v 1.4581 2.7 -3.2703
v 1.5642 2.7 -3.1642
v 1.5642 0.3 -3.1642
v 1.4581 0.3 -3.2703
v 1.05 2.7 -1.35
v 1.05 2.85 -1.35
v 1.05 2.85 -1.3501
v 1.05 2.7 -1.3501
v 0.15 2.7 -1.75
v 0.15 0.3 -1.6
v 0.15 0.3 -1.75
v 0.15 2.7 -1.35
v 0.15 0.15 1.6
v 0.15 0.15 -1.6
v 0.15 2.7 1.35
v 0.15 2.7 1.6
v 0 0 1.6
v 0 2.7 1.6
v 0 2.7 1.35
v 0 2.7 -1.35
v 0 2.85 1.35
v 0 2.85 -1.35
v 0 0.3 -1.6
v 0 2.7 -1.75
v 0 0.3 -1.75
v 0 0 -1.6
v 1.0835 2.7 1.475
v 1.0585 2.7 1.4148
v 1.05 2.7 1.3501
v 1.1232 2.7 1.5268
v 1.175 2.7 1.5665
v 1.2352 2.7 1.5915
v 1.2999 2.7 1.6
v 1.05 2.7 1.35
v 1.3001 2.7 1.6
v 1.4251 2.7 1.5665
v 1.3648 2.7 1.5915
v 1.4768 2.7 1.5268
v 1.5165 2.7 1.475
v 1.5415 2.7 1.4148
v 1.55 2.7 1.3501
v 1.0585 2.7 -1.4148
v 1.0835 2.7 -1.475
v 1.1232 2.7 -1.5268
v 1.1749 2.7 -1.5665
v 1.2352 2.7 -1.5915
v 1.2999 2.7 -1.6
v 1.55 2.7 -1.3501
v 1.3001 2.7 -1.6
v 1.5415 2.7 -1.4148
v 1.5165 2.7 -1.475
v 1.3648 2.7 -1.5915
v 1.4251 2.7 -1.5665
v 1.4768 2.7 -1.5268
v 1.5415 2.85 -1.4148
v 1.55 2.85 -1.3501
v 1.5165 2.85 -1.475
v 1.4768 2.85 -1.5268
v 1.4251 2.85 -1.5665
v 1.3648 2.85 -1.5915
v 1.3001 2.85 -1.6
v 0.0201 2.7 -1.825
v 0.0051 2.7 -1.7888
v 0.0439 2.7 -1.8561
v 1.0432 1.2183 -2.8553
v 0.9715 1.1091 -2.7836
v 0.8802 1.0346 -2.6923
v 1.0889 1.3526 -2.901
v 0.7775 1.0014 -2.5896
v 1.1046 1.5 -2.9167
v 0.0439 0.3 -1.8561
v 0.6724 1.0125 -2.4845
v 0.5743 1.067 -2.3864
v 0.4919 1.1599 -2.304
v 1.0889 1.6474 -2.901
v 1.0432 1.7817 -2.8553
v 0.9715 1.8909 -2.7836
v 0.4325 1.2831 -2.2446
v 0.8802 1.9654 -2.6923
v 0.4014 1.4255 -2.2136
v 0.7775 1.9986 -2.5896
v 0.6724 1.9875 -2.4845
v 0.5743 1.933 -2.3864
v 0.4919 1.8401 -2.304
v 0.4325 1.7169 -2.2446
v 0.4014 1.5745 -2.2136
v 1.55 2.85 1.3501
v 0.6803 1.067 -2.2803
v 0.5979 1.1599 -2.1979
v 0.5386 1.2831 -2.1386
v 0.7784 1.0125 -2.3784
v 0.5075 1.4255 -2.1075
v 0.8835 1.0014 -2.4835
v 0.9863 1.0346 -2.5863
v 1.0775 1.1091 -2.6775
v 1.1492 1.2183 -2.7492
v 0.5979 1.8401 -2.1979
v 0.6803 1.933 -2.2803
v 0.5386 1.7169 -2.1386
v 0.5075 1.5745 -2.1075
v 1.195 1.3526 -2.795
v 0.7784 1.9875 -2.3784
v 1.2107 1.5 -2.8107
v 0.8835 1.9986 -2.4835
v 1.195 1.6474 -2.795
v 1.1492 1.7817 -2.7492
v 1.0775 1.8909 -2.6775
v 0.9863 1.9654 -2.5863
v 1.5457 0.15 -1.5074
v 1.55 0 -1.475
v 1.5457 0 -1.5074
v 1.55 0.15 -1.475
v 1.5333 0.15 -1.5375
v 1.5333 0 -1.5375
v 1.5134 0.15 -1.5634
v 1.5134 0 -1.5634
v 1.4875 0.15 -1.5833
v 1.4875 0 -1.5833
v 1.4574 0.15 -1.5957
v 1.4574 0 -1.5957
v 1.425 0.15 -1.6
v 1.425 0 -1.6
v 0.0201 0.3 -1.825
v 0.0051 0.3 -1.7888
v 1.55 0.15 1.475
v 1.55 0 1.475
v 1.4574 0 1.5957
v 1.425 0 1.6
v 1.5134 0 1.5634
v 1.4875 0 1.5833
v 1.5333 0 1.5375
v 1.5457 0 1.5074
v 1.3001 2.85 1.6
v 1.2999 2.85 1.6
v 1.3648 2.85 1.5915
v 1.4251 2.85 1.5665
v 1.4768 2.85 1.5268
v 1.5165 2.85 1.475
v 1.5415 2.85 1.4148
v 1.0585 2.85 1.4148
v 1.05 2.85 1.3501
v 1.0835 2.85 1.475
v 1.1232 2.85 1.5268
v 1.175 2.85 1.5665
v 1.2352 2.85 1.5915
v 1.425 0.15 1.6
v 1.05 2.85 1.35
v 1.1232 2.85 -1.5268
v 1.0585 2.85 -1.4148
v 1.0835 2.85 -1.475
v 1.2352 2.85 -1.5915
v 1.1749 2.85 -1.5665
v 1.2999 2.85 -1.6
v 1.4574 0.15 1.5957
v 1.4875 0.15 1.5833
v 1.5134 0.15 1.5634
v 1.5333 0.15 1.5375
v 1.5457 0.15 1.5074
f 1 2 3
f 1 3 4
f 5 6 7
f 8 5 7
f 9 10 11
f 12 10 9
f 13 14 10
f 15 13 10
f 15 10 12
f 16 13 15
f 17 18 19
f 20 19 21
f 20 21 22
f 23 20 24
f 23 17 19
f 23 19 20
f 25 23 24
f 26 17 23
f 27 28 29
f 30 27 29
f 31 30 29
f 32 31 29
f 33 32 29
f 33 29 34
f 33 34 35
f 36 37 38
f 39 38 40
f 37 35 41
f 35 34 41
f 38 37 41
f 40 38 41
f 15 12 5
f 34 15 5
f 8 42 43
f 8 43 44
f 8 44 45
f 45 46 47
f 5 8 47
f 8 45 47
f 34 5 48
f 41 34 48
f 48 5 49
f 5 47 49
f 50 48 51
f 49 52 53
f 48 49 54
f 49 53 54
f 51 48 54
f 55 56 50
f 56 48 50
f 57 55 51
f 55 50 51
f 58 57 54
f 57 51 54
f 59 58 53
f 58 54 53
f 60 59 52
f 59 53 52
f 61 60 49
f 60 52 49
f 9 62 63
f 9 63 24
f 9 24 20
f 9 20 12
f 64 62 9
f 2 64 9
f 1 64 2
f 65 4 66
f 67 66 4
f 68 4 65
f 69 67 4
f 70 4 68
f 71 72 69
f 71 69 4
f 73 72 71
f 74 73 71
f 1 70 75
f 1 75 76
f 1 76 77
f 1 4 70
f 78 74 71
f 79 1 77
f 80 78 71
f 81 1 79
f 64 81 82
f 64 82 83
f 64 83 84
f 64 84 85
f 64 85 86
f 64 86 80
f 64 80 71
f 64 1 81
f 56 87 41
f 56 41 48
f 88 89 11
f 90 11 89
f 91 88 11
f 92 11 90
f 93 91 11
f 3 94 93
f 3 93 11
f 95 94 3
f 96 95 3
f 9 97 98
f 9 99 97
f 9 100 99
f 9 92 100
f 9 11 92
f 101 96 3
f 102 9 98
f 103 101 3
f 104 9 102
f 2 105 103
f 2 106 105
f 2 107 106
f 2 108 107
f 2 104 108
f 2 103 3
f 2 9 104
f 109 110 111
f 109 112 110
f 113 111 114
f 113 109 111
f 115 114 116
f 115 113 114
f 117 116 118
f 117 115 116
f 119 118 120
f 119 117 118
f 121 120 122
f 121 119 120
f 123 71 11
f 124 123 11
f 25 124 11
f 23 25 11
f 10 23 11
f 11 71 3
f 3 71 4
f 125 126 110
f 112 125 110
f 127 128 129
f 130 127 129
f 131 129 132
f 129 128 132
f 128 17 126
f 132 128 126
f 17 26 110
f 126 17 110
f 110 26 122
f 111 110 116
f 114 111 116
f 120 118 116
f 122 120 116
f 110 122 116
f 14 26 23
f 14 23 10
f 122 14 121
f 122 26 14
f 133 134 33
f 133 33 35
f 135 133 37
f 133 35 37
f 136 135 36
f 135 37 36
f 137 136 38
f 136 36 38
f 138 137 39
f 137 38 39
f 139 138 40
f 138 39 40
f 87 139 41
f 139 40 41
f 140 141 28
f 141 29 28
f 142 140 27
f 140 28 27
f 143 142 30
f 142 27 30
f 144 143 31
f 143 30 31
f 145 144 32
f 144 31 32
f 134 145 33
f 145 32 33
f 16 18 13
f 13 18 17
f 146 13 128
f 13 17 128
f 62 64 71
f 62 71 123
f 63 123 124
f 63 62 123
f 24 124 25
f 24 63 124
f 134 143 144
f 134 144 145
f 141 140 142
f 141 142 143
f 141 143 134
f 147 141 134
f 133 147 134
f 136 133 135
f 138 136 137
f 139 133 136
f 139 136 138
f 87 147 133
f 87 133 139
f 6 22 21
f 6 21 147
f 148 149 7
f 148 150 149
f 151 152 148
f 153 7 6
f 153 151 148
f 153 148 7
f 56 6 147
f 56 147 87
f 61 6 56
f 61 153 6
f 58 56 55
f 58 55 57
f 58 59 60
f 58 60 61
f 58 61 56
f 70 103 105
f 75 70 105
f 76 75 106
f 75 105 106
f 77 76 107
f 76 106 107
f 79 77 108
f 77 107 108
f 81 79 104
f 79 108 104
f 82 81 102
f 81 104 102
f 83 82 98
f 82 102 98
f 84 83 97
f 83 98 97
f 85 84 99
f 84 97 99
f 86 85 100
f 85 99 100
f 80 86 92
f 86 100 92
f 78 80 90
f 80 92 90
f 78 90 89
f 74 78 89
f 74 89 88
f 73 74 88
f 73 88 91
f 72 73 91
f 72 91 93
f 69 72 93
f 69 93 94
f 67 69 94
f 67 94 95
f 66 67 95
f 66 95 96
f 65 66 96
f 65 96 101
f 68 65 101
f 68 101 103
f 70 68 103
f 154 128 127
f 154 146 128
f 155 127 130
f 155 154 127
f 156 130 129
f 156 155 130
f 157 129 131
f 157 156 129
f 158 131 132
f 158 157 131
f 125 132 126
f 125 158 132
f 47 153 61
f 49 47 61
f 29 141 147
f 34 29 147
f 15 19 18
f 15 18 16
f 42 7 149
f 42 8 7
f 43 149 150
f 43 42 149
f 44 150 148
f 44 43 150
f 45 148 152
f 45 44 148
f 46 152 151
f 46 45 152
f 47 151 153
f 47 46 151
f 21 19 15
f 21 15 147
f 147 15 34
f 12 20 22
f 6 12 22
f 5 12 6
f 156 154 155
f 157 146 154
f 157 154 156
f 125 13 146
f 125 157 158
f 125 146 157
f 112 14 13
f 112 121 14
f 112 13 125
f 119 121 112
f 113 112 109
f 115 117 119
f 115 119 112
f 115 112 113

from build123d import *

# Parameters (mm, degrees)
SKETCH1_W           = 1.55
SKETCH1_H           = 3.2
BOSS_EXTRUDE1_DEPTH = 0.15
FILLET1_R           = 0.125
SKETCH2_W           = 0.15
SKETCH2_H           = 3.2
BOSS_EXTRUDE2_DEPTH = 2.55
SKETCH3_W           = 0.15
SKETCH3_H           = 2.4
BOSS_EXTRUDE3_DEPTH = 0.15
BOSS_EXTRUDE4_DEPTH = 2.4
SKETCH5_R           = 0.5
CUT_EXTRUDE1_DEPTH  = 5.356809265
SKETCH6_W           = 1.05
SKETCH6_H           = 2.7
BOSS_EXTRUDE5_DEPTH = 0.15
SKETCH7_W           = 0.5
SKETCH7_H           = 3.2
BOSS_EXTRUDE6_DEPTH = 0.15
FILLET2_R           = 0.25


with BuildPart() as part:
    # Sketch1 → Boss-Extrude1 (new body)
    with BuildSketch(Plane(origin=(0, 0, 0), x_dir=(1, 0, 0), z_dir=(0, 1, 0))):
        with Locations((0.775, 0)):
            Rectangle(SKETCH1_W, SKETCH1_H)
    extrude(amount=BOSS_EXTRUDE1_DEPTH)

    # Fillet1
    fillet1_edges = [part.edges().sort_by_distance(p)[0] for p in [
        (1.55, 0.075, -1.6),
        (1.55, 0.075, 1.6),
    ]]
    fillet(fillet1_edges, radius=FILLET1_R)

    # Sketch2 → Boss-Extrude2 (add)
    with BuildSketch(Plane(origin=(0, 0.15, 0), x_dir=(1, 0, 0), z_dir=(0, 1, 0))):
        with Locations((0.075, 0)):
            Rectangle(SKETCH2_W, SKETCH2_H)
    extrude(amount=BOSS_EXTRUDE2_DEPTH)

    # Sketch3 → Boss-Extrude3 (add)
    with BuildSketch(Plane(origin=(0, 0, -1.6), x_dir=(-1, 0, 0), z_dir=(0, 0, -1))):
        with Locations((-0.075, 1.5)):
            Rectangle(SKETCH3_W, SKETCH3_H)
    extrude(amount=BOSS_EXTRUDE3_DEPTH)

    # Sketch4 → Boss-Extrude4 (add)
    with BuildSketch(Plane(origin=(0, 2.7, 0), x_dir=(1, 0, 0), z_dir=(0, 1, 0))):
        with BuildLine():
            Line((0.15, 1.75), (1.564213562, 3.164213562))
            Line((1.564213562, 3.164213562), (1.458147545, 3.27027958))
            Line((1.458147545, 3.27027958), (0.043933983, 1.856066017))
            ThreePointArc((0.043933983, 1.856066017), (0.01141807, 1.807402515), (0, 1.75))
            Line((0, 1.75), (0.15, 1.75))
        make_face()
    extrude(amount=-BOSS_EXTRUDE4_DEPTH)

    # Sketch5 → Cut-Extrude1 (cut, through all)
    with BuildSketch(Plane(origin=(-0.8, 0, -0.8), x_dir=(0.7071067811865511, 0, -0.7071067811865439), z_dir=(0.7071067811865439, 0, 0.7071067811865511))):
        with Locations((2.343502884, 1.5)):
            Circle(SKETCH5_R)
    extrude(amount=-CUT_EXTRUDE1_DEPTH, mode=Mode.SUBTRACT)

    # Sketch6 → Boss-Extrude5 (add)
    with BuildSketch(Plane(origin=(0, 2.7, 0), x_dir=(1, 0, 0), z_dir=(0, 1, 0))):
        with Locations((0.525, 0)):
            Rectangle(SKETCH6_W, SKETCH6_H)
    extrude(amount=BOSS_EXTRUDE5_DEPTH)

    # Sketch7 → Boss-Extrude6 (add)
    with BuildSketch(Plane(origin=(0, 2.85, 0), x_dir=(1, 0, 0), z_dir=(0, 1, 0))):
        with Locations((1.3, 0)):
            Rectangle(SKETCH7_W, SKETCH7_H)
    extrude(amount=-BOSS_EXTRUDE6_DEPTH)

    # Fillet2
    fillet2_edges = [part.edges().sort_by_distance(p)[0] for p in [
        (1.05, 2.775, -1.6),
        (1.55, 2.775, -1.6),
        (1.05, 2.775, 1.6),
        (1.55, 2.775, 1.6),
    ]]
    fillet(fillet2_edges, radius=FILLET2_R - 0.0001)  # a hair under: the kernel refuses the full size


solid = part.part
